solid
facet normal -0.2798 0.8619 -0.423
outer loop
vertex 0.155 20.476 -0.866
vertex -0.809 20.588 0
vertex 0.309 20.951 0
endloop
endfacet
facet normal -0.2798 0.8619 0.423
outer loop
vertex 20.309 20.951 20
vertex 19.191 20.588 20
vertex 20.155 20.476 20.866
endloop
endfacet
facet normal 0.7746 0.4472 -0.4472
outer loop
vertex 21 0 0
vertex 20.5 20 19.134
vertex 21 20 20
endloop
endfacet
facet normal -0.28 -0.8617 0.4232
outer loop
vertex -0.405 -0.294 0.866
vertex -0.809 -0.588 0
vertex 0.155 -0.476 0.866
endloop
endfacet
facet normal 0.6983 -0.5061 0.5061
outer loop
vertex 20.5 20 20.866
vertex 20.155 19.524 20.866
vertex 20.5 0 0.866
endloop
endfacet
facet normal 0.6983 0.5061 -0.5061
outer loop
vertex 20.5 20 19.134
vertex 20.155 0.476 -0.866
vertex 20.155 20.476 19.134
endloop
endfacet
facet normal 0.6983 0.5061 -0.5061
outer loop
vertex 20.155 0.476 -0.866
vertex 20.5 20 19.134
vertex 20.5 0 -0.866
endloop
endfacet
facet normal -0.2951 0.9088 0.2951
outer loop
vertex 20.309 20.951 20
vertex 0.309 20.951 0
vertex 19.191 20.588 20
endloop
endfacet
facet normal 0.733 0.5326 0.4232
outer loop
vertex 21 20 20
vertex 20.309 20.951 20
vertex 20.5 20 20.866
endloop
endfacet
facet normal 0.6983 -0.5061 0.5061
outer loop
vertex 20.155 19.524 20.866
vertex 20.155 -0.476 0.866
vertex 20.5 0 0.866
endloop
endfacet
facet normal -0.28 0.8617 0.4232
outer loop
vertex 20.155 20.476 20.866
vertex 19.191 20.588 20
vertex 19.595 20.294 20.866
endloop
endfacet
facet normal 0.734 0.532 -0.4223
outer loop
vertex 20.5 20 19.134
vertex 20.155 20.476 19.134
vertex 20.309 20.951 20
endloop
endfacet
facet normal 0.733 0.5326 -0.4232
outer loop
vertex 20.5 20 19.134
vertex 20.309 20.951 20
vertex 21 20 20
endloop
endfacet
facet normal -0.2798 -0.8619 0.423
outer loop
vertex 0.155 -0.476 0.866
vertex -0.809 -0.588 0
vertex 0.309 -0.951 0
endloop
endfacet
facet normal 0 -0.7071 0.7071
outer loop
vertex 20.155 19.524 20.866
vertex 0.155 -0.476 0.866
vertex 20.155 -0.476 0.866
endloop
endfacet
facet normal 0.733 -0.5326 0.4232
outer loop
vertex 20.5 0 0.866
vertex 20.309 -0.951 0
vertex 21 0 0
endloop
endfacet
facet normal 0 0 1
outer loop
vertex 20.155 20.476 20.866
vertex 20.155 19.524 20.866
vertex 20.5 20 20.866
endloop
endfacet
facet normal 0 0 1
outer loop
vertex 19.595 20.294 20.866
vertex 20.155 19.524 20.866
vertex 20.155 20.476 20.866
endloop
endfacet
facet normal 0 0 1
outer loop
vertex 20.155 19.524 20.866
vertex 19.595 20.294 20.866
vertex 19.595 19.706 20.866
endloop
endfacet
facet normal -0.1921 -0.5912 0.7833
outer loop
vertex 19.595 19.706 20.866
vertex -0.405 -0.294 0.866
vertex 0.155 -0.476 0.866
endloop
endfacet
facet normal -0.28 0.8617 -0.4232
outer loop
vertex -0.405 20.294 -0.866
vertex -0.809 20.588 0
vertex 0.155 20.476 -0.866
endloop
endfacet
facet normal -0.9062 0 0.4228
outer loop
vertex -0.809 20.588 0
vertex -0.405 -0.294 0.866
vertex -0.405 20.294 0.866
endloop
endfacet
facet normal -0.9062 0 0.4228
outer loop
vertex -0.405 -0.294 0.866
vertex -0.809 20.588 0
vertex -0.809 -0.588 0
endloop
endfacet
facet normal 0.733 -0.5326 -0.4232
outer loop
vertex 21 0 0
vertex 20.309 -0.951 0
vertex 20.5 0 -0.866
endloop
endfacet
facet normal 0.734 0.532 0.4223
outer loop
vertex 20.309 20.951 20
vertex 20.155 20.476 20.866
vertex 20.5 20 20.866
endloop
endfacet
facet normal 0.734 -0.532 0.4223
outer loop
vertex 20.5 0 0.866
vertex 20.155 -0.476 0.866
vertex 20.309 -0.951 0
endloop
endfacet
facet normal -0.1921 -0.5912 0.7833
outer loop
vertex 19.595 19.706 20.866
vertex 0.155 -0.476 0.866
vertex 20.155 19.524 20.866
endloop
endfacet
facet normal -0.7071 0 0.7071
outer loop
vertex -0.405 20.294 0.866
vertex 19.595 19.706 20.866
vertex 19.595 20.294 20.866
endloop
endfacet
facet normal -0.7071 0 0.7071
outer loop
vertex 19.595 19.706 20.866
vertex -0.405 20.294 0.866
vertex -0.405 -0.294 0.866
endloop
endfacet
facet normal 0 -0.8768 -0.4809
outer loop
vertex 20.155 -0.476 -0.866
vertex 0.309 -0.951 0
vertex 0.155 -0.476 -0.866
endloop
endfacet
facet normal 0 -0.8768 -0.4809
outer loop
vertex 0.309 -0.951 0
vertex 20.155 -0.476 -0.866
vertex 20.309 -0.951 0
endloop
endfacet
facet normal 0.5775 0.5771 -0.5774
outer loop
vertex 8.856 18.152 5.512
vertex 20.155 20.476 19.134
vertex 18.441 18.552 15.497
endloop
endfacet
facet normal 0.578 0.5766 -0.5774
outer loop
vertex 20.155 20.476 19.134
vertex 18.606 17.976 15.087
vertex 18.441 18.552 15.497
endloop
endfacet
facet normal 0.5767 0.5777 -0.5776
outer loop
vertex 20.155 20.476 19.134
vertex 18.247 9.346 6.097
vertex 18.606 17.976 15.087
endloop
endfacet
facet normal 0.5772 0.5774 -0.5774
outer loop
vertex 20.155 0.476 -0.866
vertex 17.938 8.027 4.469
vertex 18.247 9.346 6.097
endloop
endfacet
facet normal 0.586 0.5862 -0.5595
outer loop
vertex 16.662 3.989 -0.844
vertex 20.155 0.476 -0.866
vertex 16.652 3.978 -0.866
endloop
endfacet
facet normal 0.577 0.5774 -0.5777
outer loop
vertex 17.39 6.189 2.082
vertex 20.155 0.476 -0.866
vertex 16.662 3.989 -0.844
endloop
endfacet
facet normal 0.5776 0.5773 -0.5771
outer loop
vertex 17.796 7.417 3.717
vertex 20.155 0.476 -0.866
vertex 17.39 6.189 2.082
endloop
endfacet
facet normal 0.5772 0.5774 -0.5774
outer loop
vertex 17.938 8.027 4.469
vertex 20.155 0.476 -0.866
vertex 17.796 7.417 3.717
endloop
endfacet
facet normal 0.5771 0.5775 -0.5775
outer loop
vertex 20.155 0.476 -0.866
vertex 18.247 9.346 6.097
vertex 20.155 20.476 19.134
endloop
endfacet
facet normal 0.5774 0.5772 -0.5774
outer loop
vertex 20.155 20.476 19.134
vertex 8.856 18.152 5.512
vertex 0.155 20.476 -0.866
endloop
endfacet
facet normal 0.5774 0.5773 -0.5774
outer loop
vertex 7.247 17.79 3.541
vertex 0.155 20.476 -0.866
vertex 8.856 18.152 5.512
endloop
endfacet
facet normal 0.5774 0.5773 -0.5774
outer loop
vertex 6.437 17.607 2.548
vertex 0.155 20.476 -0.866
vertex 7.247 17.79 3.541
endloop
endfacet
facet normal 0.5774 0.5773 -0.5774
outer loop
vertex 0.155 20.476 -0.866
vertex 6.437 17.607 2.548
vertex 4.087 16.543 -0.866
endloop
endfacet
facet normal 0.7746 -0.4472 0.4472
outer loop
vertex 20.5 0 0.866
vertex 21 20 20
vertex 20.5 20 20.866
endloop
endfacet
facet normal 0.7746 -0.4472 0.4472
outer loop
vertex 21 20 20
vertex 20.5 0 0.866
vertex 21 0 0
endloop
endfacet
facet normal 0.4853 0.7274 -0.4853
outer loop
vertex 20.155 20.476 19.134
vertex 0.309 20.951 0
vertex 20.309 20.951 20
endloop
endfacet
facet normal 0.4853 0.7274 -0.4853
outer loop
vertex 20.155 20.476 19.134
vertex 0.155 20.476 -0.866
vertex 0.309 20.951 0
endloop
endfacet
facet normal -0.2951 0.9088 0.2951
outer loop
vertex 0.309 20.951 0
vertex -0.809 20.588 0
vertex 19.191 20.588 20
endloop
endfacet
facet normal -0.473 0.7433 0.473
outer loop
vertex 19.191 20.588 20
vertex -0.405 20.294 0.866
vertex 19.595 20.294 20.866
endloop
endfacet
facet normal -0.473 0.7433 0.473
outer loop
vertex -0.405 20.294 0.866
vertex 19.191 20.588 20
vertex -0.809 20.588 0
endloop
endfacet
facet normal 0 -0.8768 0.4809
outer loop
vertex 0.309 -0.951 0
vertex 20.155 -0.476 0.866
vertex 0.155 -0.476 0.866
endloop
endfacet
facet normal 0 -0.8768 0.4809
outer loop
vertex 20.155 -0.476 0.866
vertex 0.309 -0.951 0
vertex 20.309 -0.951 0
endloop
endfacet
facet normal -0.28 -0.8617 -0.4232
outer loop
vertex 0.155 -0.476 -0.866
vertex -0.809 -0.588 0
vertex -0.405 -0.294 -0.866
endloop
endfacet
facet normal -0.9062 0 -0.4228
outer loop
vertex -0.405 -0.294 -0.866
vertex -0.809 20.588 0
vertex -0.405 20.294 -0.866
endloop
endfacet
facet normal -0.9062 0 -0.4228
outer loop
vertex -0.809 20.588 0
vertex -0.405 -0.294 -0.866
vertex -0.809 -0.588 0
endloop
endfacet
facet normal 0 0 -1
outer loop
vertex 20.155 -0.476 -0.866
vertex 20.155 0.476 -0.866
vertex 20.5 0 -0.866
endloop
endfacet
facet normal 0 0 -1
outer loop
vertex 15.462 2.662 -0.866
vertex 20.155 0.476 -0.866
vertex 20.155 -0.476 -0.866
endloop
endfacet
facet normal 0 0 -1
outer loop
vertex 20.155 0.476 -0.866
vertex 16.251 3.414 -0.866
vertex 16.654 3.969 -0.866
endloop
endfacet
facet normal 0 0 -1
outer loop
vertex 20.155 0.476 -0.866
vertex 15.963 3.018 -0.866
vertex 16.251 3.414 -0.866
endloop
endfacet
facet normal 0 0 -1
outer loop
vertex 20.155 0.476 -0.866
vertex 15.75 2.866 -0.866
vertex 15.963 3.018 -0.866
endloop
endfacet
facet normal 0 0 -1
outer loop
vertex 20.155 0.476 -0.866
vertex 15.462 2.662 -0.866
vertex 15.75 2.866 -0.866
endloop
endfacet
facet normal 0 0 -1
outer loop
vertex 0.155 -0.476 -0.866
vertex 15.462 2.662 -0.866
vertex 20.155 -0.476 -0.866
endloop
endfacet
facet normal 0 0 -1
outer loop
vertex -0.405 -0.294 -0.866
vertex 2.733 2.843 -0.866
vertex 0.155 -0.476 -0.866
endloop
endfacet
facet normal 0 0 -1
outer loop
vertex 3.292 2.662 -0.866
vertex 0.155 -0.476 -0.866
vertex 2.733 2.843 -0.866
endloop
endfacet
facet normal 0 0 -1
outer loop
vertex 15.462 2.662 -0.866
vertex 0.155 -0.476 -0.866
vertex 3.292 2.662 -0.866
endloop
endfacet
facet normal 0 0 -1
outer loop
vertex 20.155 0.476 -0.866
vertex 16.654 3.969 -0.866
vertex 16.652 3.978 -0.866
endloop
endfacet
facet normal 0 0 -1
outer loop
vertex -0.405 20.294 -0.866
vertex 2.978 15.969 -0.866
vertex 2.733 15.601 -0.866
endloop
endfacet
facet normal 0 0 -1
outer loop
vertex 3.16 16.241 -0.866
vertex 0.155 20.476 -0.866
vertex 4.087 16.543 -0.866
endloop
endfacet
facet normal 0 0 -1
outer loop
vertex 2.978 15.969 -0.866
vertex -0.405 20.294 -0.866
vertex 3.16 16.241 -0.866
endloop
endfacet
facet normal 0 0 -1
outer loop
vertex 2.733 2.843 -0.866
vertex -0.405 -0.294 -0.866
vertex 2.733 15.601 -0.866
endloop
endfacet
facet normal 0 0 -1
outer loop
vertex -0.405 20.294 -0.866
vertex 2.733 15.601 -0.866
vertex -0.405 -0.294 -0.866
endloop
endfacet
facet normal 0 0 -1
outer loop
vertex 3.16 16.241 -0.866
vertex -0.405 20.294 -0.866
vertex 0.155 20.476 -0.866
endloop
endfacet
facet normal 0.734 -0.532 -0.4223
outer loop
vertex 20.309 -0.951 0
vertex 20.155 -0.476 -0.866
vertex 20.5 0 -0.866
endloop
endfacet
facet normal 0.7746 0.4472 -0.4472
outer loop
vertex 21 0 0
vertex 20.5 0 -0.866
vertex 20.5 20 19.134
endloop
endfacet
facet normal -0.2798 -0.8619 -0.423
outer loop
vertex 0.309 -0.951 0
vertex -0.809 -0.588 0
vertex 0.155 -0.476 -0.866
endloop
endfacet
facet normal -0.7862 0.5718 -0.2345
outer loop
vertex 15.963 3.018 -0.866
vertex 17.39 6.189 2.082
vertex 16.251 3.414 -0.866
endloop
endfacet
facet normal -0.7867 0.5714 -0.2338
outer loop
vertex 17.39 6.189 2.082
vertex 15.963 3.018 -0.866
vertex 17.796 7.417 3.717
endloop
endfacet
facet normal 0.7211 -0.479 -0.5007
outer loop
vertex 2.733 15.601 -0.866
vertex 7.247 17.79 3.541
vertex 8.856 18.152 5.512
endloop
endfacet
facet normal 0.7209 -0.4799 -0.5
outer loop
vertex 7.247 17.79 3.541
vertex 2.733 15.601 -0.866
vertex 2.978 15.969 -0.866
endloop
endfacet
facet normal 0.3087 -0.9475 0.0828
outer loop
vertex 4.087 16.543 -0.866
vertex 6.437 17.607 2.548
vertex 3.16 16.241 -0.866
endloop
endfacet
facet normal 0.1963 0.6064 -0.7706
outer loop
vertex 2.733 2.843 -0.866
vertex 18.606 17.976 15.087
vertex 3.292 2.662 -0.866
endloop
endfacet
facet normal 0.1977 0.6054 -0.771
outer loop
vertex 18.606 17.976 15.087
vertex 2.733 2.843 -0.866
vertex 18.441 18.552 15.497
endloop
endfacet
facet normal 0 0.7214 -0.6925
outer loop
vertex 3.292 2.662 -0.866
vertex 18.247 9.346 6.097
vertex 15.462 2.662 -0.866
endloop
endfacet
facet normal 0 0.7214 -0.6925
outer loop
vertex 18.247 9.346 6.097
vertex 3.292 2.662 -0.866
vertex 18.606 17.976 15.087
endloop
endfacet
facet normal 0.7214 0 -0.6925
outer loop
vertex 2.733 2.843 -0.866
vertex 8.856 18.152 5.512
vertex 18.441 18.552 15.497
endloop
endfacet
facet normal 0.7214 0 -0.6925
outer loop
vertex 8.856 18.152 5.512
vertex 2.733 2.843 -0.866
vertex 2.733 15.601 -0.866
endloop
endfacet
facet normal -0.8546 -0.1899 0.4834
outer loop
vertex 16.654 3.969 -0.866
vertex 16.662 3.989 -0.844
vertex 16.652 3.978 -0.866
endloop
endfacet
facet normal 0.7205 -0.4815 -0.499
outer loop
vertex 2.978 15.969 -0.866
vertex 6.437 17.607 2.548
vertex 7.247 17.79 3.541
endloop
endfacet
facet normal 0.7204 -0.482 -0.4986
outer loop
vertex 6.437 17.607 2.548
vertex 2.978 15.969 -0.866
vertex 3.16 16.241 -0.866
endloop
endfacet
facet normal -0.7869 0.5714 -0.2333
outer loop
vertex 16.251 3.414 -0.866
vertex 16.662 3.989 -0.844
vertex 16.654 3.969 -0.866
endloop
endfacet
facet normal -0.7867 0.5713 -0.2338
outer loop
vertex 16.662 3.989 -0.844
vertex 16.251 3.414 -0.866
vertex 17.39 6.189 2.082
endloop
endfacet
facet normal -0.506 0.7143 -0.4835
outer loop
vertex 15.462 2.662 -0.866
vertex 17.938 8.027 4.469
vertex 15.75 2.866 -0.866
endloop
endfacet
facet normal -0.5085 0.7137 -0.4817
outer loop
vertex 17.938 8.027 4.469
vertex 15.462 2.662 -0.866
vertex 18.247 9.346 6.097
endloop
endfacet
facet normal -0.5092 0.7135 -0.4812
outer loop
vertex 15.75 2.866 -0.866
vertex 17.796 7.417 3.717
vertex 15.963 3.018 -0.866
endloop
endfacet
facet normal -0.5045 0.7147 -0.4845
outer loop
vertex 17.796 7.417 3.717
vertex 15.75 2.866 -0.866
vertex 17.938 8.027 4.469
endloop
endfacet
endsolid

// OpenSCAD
module gable() {
	hull() {
		translate( [0,0,0] ) sphere( 1 );
		translate( [20,0,0] ) sphere( 1 );
		translate( [0,20,0] ) sphere( 1 );
		translate( [20,20,20] ) sphere( 1 );
	}
}


module punch() {
	translate( [1,1,0] ) 
	hull() {
		*translate( [3,3,-30] ) sphere( 1 );
		translate( [-25,3,-30] ) sphere( 1 );
		translate( [3,-25,-30] ) sphere( 1 );
		translate( [-25,-25,-30] ) sphere( 1 );
		translate( [23,23,20] ) sphere( 1 );
	}
}

difference() {
	gable();
	punch();
}
